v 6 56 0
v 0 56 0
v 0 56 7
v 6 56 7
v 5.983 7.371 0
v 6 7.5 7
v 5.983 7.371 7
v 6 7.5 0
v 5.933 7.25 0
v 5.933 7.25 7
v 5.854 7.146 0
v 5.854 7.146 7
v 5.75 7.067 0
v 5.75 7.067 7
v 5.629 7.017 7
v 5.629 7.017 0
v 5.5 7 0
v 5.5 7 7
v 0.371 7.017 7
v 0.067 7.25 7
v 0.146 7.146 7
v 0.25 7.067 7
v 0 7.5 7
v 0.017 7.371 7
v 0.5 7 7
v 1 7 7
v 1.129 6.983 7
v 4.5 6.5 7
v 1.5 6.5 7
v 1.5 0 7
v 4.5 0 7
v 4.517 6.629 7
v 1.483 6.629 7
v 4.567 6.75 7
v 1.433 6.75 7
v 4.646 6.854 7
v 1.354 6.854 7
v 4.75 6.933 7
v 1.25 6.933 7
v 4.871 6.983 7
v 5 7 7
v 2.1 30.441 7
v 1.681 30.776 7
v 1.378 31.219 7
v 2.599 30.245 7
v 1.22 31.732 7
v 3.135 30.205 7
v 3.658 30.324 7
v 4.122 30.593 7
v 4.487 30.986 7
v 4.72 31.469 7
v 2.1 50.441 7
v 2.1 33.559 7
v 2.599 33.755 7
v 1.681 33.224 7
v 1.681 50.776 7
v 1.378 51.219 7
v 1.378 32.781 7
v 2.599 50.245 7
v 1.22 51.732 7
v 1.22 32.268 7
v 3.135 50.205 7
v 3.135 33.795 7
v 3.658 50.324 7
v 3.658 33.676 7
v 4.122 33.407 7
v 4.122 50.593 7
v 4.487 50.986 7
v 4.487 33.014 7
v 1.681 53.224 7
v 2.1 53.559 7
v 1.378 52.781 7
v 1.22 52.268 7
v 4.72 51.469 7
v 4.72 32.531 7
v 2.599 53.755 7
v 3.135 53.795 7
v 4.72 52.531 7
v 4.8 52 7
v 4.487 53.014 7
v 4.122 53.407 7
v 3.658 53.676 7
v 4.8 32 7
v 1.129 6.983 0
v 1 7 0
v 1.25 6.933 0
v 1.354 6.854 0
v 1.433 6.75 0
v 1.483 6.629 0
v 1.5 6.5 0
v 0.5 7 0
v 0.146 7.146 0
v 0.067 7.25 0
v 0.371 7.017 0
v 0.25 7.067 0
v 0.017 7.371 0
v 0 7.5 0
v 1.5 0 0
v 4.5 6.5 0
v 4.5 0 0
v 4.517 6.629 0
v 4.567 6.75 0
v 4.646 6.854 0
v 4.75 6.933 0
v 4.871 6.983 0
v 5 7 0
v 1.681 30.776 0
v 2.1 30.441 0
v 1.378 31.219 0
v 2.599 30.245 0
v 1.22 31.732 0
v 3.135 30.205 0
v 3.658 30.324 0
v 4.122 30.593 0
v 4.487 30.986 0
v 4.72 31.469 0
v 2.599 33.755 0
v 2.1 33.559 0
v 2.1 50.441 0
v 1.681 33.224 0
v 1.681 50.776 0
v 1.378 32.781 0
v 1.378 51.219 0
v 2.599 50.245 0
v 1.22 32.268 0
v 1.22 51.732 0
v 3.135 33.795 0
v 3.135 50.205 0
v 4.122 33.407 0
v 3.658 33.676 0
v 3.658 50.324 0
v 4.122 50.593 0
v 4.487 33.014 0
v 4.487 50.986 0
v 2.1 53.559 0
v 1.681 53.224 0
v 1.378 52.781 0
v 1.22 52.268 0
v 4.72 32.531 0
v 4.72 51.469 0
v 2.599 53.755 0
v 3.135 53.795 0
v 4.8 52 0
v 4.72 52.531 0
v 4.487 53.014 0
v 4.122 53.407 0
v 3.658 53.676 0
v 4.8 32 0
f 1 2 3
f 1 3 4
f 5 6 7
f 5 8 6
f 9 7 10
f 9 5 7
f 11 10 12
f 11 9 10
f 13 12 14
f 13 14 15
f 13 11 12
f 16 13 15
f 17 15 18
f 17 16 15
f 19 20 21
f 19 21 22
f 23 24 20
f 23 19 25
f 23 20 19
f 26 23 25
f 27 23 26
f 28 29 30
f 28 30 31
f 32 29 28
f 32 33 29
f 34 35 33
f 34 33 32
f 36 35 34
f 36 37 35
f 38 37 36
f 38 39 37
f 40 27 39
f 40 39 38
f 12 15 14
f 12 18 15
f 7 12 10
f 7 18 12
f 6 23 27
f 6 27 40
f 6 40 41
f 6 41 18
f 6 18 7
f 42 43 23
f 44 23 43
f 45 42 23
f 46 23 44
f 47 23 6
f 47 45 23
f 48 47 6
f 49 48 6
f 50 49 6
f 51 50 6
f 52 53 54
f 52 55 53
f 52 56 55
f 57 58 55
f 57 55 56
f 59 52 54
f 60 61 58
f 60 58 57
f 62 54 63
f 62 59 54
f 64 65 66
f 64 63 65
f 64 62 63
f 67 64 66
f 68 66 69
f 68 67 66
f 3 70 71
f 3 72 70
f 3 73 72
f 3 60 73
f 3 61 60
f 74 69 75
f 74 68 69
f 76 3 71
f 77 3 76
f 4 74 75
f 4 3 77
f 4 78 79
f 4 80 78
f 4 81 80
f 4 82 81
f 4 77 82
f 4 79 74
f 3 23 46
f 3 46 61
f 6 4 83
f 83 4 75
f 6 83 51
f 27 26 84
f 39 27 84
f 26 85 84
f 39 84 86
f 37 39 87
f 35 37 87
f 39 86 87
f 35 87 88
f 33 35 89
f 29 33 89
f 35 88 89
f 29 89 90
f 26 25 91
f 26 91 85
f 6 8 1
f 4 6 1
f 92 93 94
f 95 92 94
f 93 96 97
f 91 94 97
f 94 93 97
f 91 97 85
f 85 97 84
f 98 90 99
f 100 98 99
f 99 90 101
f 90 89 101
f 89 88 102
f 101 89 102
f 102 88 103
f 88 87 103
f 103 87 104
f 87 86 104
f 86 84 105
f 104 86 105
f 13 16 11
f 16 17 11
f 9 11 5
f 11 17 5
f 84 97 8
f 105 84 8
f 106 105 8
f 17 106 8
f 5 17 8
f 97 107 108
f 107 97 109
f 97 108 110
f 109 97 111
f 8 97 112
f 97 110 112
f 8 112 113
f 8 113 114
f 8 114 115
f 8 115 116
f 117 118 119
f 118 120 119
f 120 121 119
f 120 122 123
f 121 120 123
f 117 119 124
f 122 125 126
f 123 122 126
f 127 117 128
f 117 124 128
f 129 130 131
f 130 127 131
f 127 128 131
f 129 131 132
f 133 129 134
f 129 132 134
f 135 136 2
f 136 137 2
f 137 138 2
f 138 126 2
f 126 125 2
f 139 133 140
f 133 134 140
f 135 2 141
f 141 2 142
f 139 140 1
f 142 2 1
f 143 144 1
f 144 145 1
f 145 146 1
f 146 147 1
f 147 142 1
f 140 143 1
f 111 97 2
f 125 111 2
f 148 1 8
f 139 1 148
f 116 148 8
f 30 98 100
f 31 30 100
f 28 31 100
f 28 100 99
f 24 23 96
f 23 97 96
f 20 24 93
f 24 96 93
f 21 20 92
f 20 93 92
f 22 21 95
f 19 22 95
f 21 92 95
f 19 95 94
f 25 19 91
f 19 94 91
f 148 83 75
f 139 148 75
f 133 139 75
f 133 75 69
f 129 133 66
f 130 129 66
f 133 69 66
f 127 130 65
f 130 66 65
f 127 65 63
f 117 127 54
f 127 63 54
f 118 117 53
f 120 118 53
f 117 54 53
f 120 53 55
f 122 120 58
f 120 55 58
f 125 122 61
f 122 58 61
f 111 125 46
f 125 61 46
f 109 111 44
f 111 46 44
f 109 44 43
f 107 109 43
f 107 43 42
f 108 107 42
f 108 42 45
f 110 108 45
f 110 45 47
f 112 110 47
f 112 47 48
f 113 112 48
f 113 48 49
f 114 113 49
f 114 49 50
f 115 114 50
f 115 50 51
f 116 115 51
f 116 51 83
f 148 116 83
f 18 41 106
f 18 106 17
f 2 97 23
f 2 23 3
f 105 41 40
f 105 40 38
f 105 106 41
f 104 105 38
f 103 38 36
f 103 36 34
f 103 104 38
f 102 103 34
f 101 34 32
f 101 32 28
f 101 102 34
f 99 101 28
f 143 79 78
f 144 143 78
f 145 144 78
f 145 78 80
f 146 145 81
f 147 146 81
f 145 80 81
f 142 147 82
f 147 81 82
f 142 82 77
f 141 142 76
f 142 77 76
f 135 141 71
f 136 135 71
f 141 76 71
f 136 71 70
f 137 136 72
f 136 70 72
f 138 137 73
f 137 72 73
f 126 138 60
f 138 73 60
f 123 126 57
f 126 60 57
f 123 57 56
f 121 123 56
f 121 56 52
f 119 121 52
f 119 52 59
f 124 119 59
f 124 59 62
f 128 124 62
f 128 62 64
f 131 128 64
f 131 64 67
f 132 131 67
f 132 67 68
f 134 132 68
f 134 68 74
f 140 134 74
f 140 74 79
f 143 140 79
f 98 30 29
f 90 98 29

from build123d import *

# Parameters (mm, degrees)
F0_W     = 6
F0_H     = 56
F1_DEPTH = 7
F2_R     = 1.8
F3_DEPTH = 7.001
F4_W     = 1.5
F4_H     = 7
F5_DEPTH = 7.001
F6_R     = 0.5


with BuildPart() as f1:
    # F0 (on Top) → F1 (new body)
    with BuildSketch(Plane.XY):
        with Locations((3, 28)):
            Rectangle(F0_W, F0_H)
    extrude(amount=F1_DEPTH)

    # F2 (on face) → F3 (cut, through all)
    with BuildSketch(Plane.XY.offset(7)):
        with Locations((3, 52)):
            Circle(F2_R)
        with Locations((3, 32)):
            Circle(F2_R)
    extrude(amount=-F3_DEPTH, mode=Mode.SUBTRACT)

    # F4 (on face) → F5 (cut, through all)
    with BuildSketch(Plane.XY.offset(7)):
        with Locations((0.75, 3.5)):
            Rectangle(F4_W, F4_H)
        with Locations((5.25, 3.5)):
            Rectangle(F4_W, F4_H)
    extrude(amount=-F5_DEPTH, mode=Mode.SUBTRACT)

    # F6
    f6_edges = [f1.edges().sort_by_distance(p)[0] for p in [
        (6, 7, 3.5),
        (0, 7, 3.5),
        (4.5, 7, 3.5),
        (1.5, 7, 3.5),
    ]]
    fillet(f6_edges, radius=F6_R)


solid = f1.part
